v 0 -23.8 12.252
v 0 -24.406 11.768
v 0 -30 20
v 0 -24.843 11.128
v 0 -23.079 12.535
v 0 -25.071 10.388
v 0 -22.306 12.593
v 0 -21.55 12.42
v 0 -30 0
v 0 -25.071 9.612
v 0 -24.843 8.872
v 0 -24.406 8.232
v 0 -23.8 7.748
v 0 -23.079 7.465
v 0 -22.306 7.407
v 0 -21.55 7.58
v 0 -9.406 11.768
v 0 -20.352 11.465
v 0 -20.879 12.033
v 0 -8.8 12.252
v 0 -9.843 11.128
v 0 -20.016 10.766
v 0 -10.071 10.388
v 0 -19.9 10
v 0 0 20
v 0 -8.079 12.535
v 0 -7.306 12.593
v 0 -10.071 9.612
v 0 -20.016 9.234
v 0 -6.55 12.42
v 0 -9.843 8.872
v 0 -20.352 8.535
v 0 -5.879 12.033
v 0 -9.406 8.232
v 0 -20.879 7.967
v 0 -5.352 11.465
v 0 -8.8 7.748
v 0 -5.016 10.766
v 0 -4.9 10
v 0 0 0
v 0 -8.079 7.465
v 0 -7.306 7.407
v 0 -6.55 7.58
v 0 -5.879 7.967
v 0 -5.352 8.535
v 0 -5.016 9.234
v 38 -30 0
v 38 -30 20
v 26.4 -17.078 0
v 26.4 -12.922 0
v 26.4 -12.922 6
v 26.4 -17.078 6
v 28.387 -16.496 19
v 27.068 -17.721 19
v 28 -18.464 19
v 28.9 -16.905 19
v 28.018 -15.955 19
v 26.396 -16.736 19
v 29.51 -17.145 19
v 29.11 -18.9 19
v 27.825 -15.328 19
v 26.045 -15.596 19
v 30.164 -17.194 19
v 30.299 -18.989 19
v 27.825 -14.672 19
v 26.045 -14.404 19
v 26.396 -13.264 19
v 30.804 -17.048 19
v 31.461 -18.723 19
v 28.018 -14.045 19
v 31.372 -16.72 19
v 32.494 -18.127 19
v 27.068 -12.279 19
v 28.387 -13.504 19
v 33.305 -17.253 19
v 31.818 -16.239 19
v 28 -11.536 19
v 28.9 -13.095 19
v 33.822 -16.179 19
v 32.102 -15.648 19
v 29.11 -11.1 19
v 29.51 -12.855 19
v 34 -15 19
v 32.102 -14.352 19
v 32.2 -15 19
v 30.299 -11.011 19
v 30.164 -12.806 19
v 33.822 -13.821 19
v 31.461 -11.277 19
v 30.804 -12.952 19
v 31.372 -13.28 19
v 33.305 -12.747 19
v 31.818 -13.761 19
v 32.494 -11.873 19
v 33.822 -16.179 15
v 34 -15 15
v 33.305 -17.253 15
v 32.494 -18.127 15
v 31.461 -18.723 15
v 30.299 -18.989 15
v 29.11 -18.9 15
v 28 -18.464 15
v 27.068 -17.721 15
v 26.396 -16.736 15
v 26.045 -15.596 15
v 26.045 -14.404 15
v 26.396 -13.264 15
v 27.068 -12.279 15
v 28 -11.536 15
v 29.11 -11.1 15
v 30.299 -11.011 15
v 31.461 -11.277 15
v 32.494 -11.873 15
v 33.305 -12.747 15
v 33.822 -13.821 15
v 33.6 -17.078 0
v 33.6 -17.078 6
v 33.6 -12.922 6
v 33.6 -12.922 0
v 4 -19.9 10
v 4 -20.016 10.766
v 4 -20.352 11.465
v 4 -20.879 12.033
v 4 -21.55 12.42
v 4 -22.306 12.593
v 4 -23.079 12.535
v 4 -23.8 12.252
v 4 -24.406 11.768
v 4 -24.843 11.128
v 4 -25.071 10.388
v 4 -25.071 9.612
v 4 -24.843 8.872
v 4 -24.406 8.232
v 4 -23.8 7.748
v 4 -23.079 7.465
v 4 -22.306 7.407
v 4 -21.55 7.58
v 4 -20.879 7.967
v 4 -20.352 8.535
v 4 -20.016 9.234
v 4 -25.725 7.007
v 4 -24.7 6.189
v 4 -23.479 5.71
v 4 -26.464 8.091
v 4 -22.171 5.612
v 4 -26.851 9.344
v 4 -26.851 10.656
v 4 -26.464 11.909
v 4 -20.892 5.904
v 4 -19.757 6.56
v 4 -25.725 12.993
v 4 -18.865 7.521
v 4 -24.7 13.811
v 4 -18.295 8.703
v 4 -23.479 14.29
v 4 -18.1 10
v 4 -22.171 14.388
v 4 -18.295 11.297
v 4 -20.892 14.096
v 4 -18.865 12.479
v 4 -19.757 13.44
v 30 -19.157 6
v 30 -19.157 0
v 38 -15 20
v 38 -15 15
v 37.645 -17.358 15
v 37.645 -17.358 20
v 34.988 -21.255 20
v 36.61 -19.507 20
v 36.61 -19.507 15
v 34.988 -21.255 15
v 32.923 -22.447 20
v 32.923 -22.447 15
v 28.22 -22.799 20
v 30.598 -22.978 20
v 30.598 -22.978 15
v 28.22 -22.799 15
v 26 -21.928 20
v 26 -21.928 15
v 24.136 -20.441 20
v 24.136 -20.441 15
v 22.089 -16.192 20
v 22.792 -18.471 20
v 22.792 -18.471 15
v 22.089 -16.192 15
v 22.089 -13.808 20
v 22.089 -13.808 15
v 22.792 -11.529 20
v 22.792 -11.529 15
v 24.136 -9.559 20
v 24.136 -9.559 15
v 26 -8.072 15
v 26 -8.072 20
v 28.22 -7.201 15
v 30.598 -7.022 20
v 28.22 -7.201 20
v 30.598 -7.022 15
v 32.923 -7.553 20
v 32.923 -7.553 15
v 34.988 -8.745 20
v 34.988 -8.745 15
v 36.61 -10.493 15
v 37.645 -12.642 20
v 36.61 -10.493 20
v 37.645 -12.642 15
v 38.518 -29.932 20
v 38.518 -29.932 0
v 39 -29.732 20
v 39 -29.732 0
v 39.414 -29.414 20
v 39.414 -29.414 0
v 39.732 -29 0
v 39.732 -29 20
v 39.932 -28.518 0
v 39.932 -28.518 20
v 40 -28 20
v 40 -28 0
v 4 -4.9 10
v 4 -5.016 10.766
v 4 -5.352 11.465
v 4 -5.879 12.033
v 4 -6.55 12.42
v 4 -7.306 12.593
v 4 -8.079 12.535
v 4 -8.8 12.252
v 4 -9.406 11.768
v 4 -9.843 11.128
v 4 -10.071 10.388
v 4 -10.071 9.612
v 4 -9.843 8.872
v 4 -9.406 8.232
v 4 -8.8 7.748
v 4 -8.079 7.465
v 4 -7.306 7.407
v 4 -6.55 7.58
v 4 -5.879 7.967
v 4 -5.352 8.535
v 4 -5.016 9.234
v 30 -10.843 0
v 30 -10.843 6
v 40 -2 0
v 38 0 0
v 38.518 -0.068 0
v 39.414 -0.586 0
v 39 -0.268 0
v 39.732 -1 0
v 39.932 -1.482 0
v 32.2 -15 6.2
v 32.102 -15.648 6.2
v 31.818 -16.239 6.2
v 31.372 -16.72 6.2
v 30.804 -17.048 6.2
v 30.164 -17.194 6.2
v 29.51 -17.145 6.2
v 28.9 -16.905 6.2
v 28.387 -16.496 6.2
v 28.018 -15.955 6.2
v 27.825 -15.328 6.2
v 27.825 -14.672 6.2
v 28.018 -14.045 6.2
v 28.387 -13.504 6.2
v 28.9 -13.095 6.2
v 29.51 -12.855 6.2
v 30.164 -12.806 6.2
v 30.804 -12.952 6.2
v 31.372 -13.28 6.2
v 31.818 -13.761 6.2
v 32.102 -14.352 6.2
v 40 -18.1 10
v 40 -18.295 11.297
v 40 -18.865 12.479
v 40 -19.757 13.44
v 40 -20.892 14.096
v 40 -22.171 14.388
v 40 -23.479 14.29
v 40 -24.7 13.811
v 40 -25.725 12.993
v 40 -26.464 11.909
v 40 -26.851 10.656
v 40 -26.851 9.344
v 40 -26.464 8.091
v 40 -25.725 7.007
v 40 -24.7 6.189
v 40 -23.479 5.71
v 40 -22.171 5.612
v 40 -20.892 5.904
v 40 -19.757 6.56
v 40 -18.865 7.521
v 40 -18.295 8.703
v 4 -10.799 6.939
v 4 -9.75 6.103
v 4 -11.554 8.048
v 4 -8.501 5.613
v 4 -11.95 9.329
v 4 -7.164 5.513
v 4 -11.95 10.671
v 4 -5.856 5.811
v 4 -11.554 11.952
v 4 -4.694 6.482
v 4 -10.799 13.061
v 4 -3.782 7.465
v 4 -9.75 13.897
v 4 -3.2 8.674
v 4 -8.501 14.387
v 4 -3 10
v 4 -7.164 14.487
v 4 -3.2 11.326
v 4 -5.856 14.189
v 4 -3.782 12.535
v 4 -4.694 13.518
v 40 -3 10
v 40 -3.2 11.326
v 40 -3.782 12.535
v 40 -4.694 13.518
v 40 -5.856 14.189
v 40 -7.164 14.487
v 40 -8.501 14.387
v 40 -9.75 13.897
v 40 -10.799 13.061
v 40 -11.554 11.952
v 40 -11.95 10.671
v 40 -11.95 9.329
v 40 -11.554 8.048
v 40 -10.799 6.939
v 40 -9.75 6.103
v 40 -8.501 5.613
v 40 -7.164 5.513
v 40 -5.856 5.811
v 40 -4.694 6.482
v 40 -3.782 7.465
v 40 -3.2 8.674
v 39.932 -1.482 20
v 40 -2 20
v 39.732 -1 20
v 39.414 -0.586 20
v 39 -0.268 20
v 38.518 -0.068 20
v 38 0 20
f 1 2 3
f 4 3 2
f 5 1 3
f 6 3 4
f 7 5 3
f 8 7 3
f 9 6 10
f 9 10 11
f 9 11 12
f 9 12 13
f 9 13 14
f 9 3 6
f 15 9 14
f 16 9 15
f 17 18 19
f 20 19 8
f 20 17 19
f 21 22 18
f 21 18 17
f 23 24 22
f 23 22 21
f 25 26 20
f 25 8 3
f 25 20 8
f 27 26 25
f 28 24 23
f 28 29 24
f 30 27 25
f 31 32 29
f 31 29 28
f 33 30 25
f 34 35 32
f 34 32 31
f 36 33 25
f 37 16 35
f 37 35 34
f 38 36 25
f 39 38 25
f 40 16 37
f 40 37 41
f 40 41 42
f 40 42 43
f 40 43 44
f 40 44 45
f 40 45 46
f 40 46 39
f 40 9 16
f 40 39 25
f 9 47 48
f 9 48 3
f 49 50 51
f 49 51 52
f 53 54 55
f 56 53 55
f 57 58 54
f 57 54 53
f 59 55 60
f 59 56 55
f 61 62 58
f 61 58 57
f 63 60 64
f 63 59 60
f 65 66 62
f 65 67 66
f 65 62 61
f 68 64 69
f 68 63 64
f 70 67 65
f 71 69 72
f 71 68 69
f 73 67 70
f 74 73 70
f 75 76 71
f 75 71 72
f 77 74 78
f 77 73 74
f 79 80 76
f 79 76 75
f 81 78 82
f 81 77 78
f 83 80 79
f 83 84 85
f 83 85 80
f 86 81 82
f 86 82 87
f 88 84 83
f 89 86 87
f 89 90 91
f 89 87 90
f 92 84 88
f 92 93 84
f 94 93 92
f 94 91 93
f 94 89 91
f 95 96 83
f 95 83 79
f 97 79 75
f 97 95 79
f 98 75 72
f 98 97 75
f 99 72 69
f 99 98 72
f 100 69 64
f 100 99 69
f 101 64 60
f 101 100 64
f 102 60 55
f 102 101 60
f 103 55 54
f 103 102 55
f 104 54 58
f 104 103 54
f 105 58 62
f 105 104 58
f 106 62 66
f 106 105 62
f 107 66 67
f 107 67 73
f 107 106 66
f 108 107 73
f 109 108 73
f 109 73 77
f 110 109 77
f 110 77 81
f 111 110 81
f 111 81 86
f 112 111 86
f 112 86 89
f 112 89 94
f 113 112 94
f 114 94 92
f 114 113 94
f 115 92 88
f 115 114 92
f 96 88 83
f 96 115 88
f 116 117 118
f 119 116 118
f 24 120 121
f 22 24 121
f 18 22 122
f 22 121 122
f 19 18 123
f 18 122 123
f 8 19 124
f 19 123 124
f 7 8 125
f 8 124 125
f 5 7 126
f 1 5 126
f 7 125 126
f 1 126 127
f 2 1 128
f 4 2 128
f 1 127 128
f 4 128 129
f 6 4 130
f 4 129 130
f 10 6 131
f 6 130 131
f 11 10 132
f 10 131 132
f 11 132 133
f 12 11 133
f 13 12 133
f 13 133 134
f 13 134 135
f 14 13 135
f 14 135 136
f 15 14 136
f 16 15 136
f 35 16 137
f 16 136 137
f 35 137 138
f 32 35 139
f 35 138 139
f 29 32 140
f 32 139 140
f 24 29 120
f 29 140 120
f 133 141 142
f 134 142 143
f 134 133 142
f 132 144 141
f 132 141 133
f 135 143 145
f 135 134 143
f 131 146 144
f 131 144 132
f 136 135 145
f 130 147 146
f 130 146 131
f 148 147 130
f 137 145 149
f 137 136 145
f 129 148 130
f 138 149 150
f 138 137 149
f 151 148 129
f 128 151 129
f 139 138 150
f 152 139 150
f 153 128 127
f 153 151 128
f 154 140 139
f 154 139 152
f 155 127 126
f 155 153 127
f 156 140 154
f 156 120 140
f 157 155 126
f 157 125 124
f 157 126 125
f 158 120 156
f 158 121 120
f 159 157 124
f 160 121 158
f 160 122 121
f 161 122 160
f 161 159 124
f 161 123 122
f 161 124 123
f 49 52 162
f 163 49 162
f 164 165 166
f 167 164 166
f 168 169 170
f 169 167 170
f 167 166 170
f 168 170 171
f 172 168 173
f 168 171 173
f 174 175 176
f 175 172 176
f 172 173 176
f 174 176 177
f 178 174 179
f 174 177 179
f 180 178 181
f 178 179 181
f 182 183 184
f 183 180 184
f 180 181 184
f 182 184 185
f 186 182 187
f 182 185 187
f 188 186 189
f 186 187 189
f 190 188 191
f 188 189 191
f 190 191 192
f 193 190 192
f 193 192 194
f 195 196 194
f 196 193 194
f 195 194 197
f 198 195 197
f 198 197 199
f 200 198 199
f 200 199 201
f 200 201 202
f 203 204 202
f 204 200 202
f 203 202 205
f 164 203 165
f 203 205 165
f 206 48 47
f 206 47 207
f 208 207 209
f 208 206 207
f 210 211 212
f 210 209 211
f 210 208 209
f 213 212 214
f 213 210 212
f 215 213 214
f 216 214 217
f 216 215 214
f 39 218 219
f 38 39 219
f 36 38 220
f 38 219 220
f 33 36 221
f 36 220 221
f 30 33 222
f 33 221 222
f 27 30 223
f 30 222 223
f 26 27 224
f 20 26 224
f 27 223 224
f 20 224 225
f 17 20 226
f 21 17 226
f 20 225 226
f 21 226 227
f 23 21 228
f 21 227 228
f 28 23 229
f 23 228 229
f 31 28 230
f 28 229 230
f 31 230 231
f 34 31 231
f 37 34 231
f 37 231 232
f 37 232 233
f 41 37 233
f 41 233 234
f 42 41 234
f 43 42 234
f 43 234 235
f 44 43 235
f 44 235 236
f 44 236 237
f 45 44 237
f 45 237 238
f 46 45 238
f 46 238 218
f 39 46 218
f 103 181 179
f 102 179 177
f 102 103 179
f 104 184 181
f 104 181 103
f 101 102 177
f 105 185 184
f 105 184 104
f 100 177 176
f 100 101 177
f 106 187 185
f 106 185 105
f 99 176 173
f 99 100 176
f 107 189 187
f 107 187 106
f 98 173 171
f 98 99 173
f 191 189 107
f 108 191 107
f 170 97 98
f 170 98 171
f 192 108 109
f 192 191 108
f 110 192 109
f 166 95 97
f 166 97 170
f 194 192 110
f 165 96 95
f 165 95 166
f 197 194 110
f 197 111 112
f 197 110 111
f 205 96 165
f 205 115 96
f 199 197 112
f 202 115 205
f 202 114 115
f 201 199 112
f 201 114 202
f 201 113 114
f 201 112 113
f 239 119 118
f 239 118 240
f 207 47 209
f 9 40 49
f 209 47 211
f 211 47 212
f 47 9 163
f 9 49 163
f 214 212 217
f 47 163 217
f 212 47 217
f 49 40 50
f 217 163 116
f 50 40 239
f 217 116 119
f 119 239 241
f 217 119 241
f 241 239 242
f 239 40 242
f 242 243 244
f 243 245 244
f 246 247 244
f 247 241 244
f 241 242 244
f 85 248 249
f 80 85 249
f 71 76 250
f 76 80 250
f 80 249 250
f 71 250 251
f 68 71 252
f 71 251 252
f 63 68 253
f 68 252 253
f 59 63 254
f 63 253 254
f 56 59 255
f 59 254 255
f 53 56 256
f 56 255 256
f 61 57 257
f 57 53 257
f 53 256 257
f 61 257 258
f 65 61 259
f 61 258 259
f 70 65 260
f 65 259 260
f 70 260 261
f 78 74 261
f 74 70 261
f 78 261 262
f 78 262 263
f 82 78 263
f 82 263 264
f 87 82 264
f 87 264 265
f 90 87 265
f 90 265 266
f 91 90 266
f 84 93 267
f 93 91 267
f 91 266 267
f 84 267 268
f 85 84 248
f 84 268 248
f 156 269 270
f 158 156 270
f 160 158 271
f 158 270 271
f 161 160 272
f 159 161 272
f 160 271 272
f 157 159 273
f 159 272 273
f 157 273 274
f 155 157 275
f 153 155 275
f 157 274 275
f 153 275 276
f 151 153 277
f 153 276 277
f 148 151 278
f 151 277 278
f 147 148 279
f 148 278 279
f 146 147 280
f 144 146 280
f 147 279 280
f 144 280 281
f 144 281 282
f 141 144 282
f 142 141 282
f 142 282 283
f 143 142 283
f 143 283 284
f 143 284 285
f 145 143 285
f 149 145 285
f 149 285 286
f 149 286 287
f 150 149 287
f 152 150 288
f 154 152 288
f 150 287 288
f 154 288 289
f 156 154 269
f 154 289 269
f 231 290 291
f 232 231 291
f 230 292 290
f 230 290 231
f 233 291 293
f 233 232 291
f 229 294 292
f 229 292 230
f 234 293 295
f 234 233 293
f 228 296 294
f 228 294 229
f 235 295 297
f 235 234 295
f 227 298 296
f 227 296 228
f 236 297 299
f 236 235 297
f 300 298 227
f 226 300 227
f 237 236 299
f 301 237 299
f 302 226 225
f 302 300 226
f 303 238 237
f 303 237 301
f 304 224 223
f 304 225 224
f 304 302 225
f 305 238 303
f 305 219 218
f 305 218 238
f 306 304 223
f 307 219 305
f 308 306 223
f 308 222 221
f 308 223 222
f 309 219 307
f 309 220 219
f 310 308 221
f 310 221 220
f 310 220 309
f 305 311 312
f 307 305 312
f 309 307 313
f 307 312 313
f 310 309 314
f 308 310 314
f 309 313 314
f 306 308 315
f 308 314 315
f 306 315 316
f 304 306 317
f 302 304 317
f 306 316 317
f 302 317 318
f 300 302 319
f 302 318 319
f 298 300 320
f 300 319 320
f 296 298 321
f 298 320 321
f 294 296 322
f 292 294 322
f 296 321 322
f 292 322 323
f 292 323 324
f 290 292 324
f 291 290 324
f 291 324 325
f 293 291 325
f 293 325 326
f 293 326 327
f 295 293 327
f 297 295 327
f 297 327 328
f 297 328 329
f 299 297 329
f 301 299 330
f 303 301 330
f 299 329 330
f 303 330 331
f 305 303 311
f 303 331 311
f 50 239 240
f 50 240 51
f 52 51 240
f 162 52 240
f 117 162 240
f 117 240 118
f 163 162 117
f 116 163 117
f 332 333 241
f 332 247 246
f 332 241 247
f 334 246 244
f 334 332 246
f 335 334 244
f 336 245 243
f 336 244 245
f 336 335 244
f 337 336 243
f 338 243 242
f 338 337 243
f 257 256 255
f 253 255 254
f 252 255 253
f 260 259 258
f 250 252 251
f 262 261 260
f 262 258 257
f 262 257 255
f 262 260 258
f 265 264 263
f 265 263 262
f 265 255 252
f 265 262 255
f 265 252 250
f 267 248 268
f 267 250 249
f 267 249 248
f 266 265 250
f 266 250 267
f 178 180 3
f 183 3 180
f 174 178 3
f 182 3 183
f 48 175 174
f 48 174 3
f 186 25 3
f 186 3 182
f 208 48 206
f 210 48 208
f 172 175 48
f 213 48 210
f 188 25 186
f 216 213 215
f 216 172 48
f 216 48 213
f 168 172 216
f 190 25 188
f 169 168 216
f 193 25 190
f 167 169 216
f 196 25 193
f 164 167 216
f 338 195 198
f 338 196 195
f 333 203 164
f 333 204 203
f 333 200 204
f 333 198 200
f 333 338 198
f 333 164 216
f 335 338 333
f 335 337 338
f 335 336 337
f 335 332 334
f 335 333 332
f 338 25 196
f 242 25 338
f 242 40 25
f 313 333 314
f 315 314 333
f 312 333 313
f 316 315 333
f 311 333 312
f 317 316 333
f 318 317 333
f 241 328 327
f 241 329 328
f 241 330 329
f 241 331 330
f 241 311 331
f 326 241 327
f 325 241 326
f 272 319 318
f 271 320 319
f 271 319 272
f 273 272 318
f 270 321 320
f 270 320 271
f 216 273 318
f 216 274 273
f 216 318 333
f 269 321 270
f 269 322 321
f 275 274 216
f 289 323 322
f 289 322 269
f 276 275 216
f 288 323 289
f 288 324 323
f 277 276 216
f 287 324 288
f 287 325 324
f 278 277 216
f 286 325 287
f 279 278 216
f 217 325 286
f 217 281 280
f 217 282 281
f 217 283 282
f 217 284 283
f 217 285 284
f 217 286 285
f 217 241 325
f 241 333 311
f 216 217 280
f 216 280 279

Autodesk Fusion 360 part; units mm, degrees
sketch "Sketch1" plane through (0, 0, 0) normal (0, 0, 1) x (1, 0, 0)
  line L0 (0, 0) -> (40, 0)
  line L1 (40, 0) -> (40, -30)
  line L2 (40, -30) -> (0, -30)
  line L3 (0, -30) -> (0, 0)
  line L4 (30, 0) -> (30, -30) construction
  line L5 (40, -15) -> (0, -15) construction
  circle A0 centre (30, -15) radius 8
  circle A1 centre (30, -15) radius 4
  circle A2 centre (30, -15) radius 2.2
  line L6 (33.6, -12.9215) -> (30, -10.8431)
  line L7 (30, -10.8431) -> (26.4, -12.9215)
  line L8 (26.4, -12.9215) -> (26.4, -17.0785)
  line L9 (26.4, -17.0785) -> (30, -19.1569)
  line L10 (30, -19.1569) -> (33.6, -17.0785)
  line L11 (33.6, -17.0785) -> (33.6, -12.9215)
  point P0 (30, -15)
  dimension "d1" = 40
  dimension "d2" = 30
  dimension "d3" = 10
  dimension "d4" = 15
  dimension "d5" = 16
  dimension "d6" = 8
  dimension "d7" = 4.4
  dimension "d17" = 3.6
extrude "Extrude1" add sketch "Sketch1" along normal blind 20 contours L0 L1 L2 L3
extrude "Extrude3" add sketch "Sketch1" along normal blind 15 contours A0 | A1 L6 L11 | A1 L10 L11 | A1 L6 L7 | A1 L9 L10 | A1 L7 L8 | A1 L8 L9
extrude "Extrude4" add sketch "Sketch1" along normal blind 19 contours A1 L11 | A1 L6 L7 L8 L9 L10 L11 | A1 L6 | A1 L10 | A1 L7 | A1 L9 | A1 L8 | A2
extrude "Extrude5" cut sketch "Sketch1" along normal blind 6 contours A1 L6 L7 L8 L9 L10 L11 | A1 L6 L11 | A1 L10 L11 | A1 L6 L7 | A1 L9 L10 | A1 L7 L8 | A1 L8 L9 | A2
extrude "Extrude8" cut sketch "Sketch1" along normal up to surface (12.8 mm away) from surface at 6.2 contours A2
sketch "Sketch2" plane through (40, 0, 0) normal (1, 0, 0) x (0, 1, 0)
  line L0 (-30, 0) -> (0, 0)
  line L1 (0, 0) -> (0, 20)
  line L2 (0, 20) -> (-30, 20)
  line L3 (-30, 20) -> (-30, 0)
  line L4 (-22.5, 20) -> (-22.5, 0) construction
  line L5 (-7.5, 20) -> (-7.5, 0) construction
  line L6 (-30, 10) -> (0, 10) construction
  line L7 (0, 0) -> (-30, 0) construction
  line L8 (-15, 20) -> (-15, 0) construction
  circle A0 centre (-7.5, 10) radius 2.6
  circle A1 centre (-7.5, 10) radius 4.5
  circle A2 centre (-22.5, 10) radius 2.6
  circle A3 centre (-22.5, 10) radius 4.4
  dimension "d21" = 10
  dimension "d22" = 15
  dimension "d23" = 15
  dimension "d24" = 7.5
  dimension "d25" = 5.2
  dimension "d26" = 9
  dimension "d27" = 5.2
  dimension "d28" = 8.8
extrude "Extrude6" cut sketch "Sketch2" against normal up to surface (36 mm away) contours A0 | A1 | A2 | A3
extrude "Extrude7" cut sketch "Sketch2" against normal up to surface (4 mm away) from surface at -36 contours A0 | A2
fillet "Fillet1" radius 2 2 edges at (40, 0, 10) (40, -30, 10)
